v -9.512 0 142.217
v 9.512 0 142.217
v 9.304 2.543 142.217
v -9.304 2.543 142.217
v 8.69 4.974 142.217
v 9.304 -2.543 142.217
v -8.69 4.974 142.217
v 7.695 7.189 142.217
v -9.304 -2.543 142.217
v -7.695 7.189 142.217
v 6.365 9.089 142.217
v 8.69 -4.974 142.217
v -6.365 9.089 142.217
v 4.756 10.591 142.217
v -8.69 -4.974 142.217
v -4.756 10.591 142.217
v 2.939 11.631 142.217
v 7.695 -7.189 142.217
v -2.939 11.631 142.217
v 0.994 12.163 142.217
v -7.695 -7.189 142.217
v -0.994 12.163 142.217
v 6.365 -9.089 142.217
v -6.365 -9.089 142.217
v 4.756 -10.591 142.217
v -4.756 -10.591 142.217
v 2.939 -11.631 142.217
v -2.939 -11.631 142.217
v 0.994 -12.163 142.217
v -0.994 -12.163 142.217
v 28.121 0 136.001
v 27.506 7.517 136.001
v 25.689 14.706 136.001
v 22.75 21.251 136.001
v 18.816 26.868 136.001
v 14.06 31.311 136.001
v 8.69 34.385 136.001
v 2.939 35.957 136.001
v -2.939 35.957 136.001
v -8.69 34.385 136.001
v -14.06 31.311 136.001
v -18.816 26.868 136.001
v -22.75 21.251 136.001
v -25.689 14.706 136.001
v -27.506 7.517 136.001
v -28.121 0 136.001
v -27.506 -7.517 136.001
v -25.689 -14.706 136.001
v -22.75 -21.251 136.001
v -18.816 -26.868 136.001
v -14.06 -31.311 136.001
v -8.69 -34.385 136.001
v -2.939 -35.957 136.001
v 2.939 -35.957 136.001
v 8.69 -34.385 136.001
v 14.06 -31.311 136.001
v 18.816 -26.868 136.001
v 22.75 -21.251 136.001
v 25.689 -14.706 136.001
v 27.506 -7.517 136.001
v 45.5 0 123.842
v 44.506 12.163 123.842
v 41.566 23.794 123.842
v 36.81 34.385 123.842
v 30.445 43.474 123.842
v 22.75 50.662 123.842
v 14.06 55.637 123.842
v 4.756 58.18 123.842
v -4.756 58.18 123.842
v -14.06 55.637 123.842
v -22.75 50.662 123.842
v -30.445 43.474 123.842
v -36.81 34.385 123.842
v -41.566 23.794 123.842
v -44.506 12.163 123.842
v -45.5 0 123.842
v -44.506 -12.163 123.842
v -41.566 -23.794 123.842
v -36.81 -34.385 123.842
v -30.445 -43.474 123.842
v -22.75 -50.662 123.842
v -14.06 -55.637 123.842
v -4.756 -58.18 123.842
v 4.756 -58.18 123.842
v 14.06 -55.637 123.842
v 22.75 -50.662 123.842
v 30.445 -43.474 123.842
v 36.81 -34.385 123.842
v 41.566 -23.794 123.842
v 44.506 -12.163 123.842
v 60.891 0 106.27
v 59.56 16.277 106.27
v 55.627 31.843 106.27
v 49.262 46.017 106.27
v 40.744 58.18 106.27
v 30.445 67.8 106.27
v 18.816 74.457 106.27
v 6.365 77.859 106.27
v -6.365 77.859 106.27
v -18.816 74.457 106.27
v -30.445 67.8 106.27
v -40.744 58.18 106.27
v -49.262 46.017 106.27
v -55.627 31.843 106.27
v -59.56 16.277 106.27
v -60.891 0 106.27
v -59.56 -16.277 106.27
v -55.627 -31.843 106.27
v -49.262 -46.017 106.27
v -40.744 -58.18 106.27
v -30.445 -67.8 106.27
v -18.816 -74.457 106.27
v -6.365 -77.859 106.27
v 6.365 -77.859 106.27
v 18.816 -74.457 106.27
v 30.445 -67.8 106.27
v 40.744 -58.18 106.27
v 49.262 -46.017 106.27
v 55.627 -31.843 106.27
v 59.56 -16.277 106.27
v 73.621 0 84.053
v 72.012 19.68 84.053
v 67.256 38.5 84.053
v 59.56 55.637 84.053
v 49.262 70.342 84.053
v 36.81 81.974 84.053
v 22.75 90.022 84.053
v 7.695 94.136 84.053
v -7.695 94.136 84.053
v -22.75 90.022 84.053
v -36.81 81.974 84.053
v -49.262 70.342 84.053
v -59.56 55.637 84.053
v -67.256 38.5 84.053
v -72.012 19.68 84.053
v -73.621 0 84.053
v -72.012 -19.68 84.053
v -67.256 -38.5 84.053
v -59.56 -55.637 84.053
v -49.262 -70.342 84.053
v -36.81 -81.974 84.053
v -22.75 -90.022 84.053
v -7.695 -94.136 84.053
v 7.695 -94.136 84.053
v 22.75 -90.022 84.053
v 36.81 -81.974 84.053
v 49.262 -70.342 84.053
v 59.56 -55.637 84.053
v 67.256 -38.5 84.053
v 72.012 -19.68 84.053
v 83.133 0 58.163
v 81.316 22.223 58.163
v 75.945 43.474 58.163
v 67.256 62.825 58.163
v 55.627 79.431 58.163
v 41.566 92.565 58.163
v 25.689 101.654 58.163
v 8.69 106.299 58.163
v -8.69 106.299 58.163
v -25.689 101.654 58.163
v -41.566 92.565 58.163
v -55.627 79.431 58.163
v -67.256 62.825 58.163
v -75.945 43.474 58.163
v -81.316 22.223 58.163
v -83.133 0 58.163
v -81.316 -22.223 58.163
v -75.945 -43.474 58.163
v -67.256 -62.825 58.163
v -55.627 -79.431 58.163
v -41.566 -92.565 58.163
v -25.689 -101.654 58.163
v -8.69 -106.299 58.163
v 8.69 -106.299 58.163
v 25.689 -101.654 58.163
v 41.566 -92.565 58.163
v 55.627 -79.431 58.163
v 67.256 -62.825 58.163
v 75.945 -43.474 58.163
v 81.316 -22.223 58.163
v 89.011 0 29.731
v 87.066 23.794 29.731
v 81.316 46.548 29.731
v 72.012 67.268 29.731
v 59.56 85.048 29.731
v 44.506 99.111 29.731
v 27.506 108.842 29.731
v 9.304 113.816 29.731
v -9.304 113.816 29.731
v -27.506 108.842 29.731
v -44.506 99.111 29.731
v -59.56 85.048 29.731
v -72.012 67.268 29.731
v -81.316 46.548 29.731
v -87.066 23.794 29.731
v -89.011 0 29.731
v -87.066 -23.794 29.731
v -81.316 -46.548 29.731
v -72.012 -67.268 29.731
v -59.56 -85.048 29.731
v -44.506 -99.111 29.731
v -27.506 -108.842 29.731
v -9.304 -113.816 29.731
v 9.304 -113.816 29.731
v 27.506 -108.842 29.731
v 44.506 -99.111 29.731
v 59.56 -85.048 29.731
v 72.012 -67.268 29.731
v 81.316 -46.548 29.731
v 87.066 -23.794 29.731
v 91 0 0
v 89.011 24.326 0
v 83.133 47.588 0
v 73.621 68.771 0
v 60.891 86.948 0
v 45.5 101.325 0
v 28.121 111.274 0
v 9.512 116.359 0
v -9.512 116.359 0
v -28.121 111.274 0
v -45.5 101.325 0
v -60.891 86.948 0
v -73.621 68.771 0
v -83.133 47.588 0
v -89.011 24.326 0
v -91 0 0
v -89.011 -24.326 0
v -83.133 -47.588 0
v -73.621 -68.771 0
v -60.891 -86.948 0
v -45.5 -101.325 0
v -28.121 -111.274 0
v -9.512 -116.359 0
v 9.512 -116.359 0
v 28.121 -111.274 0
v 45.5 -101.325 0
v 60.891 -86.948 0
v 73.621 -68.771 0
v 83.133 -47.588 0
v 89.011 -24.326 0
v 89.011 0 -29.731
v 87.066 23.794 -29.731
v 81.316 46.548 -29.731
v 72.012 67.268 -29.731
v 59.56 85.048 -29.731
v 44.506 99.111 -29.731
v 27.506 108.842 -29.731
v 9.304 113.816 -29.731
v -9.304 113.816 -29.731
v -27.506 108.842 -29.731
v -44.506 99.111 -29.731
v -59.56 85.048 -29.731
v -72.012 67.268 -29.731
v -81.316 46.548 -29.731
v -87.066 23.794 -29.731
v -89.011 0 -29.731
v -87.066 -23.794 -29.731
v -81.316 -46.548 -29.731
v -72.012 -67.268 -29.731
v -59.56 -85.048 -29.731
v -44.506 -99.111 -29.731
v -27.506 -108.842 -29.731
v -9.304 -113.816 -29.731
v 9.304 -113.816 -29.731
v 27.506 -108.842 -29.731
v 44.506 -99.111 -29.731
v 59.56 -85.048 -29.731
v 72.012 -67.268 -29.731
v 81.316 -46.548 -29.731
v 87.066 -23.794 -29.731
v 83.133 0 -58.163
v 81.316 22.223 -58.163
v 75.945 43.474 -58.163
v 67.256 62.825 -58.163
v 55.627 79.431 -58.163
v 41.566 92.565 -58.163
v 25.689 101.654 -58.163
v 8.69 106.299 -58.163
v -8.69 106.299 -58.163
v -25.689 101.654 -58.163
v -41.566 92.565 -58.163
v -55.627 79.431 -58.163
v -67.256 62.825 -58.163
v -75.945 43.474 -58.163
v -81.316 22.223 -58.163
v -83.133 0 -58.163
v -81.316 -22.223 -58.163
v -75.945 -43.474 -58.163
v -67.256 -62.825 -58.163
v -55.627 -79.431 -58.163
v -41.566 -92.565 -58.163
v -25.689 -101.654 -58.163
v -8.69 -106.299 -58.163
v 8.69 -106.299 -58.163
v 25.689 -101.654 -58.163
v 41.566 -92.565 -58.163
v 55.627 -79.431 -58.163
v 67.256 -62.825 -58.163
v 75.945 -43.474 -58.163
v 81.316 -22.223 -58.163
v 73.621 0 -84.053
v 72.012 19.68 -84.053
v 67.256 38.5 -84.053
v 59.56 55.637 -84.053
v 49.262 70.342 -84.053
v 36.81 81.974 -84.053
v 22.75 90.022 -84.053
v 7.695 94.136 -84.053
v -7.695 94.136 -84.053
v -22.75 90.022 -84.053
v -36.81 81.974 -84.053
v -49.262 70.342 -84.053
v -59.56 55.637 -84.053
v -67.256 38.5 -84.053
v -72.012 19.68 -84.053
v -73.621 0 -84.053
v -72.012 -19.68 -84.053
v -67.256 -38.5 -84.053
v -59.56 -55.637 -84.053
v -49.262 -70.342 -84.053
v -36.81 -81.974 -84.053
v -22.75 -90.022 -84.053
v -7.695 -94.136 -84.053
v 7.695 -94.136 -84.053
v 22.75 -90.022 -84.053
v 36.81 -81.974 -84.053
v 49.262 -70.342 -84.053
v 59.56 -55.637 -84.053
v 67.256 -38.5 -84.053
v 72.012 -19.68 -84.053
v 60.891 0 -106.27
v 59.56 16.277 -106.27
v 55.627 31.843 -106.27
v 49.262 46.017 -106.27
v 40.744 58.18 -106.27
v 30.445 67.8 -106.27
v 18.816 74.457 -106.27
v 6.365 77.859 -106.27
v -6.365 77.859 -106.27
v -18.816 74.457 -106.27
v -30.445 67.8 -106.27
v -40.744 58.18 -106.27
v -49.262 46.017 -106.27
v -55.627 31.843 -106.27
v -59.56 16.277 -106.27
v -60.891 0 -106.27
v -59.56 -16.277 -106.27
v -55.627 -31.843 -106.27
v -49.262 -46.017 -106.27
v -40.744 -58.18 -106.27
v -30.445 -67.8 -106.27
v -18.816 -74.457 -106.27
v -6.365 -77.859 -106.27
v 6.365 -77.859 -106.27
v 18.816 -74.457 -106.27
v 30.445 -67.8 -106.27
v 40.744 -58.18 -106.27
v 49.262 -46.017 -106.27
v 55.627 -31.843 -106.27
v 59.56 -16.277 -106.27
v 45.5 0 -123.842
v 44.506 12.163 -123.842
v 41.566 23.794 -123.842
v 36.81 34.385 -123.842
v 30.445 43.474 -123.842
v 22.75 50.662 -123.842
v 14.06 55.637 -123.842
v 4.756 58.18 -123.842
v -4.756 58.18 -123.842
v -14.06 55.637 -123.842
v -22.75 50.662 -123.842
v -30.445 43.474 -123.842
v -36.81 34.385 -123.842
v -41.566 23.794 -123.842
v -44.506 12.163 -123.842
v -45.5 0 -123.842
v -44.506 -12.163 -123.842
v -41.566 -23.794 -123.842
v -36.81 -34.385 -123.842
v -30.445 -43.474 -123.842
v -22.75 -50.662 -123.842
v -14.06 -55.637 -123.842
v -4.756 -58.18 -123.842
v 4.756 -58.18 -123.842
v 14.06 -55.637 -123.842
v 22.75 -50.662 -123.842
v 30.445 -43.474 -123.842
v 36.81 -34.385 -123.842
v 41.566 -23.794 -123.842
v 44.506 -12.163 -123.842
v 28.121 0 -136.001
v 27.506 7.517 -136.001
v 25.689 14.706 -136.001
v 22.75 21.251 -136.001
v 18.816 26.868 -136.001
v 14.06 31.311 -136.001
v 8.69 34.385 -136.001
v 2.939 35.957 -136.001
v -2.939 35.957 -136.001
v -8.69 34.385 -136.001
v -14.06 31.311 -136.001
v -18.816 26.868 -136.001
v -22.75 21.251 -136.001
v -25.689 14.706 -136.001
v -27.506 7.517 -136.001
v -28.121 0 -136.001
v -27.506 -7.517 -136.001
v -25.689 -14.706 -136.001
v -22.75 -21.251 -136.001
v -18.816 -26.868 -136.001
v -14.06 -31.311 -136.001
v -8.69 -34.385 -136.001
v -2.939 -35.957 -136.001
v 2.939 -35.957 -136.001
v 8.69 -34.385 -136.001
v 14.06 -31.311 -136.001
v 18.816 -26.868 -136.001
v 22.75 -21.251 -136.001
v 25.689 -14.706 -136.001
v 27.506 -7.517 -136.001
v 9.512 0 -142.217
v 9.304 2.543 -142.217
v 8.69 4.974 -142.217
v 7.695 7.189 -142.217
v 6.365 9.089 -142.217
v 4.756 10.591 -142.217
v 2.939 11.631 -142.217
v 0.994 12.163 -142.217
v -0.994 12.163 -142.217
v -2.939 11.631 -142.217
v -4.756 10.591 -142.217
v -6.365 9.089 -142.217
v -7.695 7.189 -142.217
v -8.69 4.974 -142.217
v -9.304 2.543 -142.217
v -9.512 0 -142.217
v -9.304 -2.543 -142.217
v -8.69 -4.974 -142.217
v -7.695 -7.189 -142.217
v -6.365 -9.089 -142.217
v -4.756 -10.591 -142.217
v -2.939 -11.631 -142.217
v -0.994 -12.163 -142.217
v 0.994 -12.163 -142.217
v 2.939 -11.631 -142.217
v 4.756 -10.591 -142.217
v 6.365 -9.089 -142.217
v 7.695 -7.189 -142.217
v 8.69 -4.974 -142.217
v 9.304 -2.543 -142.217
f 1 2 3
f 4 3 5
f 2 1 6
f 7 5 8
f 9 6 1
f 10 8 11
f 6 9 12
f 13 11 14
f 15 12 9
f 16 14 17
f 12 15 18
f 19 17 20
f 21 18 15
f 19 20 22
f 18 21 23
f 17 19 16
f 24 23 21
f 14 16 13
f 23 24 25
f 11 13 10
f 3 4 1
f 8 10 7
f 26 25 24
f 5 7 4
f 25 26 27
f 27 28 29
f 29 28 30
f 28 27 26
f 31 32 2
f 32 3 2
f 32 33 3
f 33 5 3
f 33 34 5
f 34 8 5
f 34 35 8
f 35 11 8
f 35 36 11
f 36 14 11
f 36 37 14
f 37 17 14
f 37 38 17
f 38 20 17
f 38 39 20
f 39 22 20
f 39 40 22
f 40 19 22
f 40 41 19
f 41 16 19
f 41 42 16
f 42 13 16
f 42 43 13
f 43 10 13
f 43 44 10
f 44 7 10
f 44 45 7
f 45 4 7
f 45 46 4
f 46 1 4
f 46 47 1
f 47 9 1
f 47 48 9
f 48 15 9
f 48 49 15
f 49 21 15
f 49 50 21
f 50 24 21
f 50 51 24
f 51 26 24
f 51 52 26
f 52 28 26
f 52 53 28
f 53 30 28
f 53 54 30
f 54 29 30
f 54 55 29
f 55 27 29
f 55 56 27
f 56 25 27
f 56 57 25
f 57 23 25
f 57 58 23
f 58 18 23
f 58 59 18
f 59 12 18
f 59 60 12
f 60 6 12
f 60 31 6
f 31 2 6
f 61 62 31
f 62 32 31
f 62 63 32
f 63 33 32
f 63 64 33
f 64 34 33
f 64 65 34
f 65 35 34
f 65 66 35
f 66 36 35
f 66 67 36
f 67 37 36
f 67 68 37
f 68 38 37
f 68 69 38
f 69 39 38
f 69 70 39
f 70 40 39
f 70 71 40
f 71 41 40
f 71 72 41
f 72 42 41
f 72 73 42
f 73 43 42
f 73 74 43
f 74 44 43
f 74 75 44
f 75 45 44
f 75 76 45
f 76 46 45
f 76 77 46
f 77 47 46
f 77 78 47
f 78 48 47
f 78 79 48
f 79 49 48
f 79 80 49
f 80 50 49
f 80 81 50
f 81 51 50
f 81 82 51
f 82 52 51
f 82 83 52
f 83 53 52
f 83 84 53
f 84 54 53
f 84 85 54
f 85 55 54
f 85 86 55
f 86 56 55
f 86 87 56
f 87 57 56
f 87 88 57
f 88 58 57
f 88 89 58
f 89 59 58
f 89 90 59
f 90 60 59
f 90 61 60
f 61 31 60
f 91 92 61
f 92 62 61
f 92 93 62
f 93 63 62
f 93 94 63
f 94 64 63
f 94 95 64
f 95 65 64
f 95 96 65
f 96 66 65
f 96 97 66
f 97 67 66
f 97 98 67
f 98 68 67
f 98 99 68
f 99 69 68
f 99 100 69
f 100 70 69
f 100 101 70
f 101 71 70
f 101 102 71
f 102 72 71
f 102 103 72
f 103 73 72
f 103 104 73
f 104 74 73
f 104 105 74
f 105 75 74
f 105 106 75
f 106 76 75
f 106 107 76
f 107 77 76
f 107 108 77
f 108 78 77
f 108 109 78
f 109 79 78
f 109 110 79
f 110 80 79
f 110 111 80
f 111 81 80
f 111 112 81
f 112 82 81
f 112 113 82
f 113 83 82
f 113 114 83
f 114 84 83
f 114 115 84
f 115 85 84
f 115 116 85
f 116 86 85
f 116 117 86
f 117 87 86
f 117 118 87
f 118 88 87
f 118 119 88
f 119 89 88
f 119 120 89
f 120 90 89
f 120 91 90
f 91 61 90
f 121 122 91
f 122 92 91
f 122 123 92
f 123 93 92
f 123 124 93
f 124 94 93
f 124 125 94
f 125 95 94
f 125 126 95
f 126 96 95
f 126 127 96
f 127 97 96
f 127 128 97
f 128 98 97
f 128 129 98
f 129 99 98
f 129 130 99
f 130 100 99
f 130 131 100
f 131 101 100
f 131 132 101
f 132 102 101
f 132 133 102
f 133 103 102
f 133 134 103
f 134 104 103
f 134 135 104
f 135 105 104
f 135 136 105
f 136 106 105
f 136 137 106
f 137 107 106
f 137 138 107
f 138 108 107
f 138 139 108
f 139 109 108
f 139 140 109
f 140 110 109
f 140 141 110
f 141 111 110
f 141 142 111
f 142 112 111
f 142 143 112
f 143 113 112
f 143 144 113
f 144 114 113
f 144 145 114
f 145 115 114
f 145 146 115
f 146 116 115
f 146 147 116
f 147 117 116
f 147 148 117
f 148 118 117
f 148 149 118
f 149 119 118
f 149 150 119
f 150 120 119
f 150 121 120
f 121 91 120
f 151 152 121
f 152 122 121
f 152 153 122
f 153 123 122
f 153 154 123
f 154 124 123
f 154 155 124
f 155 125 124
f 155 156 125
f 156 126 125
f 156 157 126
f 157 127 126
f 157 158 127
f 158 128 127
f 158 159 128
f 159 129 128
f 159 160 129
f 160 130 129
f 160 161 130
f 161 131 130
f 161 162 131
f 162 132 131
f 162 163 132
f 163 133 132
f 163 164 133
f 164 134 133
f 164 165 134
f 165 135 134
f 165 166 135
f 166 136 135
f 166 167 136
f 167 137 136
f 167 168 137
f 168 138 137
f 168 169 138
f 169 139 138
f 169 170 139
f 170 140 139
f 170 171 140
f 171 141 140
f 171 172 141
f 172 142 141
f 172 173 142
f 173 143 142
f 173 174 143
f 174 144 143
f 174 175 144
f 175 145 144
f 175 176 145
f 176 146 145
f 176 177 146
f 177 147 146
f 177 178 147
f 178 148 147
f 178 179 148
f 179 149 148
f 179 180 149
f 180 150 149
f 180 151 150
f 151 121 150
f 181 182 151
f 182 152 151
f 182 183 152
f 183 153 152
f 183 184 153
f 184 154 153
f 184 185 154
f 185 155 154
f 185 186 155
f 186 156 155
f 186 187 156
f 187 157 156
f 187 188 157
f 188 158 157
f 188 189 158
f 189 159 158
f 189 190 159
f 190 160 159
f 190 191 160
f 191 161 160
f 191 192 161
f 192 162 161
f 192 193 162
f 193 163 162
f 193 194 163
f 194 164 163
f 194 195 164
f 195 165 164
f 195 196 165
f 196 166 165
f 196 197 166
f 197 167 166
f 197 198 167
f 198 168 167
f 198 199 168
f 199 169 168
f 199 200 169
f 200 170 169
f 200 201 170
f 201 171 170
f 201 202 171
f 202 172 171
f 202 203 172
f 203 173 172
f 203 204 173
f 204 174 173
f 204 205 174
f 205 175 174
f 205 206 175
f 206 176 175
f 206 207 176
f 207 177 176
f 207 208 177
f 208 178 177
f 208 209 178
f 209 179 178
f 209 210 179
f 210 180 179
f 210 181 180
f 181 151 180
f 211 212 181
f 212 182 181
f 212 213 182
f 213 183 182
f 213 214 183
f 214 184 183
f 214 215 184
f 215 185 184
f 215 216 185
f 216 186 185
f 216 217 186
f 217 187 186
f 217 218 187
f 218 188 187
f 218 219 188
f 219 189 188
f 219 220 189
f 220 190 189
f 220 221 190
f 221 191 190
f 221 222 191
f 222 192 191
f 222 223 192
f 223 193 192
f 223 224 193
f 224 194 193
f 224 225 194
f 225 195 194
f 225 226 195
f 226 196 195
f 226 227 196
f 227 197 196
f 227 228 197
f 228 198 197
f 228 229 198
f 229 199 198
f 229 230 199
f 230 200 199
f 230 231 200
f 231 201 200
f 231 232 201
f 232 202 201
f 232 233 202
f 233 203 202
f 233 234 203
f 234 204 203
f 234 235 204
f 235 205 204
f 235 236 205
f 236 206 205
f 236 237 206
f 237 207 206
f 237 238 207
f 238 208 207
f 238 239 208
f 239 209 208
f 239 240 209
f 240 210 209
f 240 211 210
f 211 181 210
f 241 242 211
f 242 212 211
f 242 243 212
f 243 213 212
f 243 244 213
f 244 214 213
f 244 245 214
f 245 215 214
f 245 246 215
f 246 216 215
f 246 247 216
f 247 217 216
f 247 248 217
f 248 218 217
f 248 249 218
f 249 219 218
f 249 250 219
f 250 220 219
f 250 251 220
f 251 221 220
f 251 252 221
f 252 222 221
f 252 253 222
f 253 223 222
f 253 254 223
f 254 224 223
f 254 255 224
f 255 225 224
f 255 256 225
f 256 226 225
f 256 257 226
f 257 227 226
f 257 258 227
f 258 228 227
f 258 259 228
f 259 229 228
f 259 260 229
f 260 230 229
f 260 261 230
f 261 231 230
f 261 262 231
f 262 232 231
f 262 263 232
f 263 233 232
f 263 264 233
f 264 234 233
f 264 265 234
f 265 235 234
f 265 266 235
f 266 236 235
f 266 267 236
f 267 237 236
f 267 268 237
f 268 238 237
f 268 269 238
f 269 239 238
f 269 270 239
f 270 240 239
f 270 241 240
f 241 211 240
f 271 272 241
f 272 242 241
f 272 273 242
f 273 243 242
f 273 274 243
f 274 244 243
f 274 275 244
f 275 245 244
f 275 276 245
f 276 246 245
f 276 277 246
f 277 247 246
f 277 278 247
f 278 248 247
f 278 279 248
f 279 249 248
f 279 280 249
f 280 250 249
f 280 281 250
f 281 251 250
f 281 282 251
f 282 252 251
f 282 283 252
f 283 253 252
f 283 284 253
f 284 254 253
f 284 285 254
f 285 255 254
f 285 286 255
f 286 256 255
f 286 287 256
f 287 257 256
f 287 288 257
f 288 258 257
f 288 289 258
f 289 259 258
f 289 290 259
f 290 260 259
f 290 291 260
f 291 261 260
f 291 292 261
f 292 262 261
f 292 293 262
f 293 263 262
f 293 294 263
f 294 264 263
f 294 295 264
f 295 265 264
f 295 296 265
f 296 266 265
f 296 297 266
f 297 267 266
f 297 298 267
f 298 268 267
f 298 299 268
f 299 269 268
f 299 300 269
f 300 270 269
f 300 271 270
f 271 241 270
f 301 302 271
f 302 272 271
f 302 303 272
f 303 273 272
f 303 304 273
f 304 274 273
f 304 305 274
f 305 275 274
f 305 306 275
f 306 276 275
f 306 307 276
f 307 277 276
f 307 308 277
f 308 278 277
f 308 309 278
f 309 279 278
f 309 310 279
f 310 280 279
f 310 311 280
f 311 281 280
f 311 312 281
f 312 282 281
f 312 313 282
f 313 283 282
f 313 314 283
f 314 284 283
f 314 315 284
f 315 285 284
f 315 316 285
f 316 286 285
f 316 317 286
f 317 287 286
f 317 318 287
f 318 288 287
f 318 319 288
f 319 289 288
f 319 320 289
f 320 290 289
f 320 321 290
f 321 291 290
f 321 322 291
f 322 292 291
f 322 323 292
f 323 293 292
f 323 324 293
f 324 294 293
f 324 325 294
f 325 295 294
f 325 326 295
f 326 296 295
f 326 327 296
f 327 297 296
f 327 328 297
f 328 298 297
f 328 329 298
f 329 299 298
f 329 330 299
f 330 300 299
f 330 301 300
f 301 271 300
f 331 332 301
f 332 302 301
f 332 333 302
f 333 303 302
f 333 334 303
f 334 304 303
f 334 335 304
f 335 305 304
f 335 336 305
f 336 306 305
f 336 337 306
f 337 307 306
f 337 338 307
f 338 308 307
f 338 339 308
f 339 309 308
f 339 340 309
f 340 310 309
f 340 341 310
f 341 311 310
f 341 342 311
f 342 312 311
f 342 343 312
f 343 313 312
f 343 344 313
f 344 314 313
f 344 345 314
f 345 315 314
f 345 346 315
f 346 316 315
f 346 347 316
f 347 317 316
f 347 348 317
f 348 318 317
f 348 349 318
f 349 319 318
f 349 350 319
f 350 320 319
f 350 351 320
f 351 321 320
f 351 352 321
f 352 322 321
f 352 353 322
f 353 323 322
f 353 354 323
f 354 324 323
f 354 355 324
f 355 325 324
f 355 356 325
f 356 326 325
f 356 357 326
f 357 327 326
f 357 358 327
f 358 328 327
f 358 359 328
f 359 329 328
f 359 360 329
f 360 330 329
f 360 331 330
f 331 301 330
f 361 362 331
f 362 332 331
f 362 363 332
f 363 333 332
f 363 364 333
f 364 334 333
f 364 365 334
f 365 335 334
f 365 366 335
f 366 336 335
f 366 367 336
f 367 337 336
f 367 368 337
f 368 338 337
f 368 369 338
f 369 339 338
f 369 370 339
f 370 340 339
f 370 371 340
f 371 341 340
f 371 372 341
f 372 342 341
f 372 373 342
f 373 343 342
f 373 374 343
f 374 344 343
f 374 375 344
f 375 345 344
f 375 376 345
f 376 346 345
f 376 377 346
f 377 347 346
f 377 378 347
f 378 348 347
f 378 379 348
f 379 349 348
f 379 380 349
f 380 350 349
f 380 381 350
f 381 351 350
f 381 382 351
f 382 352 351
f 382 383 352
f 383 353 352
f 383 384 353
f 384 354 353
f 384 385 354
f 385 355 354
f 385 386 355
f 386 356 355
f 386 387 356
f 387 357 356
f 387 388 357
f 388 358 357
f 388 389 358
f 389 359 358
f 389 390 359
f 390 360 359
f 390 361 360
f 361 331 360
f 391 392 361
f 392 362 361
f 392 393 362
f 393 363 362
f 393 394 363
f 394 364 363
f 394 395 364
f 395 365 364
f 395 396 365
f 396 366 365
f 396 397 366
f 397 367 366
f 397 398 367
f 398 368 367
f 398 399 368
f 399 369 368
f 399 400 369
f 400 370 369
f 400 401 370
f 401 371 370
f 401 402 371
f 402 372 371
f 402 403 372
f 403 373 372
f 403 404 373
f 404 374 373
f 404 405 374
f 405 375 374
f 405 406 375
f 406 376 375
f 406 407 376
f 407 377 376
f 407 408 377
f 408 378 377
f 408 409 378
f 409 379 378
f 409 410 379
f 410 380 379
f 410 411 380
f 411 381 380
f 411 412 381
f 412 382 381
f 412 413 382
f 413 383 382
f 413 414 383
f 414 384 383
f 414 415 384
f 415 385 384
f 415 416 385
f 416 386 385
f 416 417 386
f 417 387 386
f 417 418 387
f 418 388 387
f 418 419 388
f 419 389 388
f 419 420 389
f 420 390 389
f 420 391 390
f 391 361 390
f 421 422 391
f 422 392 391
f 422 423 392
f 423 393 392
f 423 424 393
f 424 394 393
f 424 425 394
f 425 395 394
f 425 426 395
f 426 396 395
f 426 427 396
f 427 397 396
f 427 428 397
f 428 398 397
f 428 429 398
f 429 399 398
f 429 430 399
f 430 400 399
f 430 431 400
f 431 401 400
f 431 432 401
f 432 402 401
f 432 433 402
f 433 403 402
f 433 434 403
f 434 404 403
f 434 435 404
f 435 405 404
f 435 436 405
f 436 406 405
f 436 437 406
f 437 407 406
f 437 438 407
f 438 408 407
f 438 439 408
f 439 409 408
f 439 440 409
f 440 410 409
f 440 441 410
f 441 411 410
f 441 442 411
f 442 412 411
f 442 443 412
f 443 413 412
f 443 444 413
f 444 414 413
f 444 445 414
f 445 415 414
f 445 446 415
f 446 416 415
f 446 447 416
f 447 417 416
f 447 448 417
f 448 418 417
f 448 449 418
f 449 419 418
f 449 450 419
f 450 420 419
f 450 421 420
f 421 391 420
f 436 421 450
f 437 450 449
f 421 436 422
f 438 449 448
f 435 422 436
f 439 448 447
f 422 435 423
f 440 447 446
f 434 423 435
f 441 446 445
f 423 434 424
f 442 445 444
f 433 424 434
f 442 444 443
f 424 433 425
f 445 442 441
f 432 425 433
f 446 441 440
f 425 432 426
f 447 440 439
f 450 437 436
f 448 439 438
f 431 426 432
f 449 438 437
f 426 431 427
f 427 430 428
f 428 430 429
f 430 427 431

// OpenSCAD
// Generated by SolidPython 1.0.1 on 2020-07-29 00:39:26


scale(v = [7, 9, 11]) {
	sphere(r = 13);
}
/***********************************************
*********      SolidPython code:      **********
************************************************
 
# import packages: SolidPython
from solid import *
from solid.utils import *
from itertools import chain, combinations


class Resize:

    def __init__(self, scad_file):
        self.scad_file = scad_file
        #self.scad_file = import_scad(scad_file)
        # cone/cylinder param:
        self.r1 = 0
        self.r2 = 0
        self.h = 0
        # rectangular prism param:
        self.w = 0
        self.l = 0
        # ellipse param:
        self.r = 0

    # import OpenScad code (file name corresponds to shape)


    # classify shape + parameters
    def assign(self, param1, param2, param3):
        if self.scad_file == 'cone.scad':
            self.r1 = param1
            self.r2 = param2
            self.h = param3
        elif self.scad_file == 'cylinder.scad':
            self.r1 = param1
            self.r2 = param2
            self.h = param3
        elif self.scad_file == 'rectangularPrism.scad':
            self.h = param1
            self.l = param2
            self.w = param3
        else:
            self.r = param1
            self.h = param2

    # resize parameters
    def iterate(self):
        x = range(3, 20, 2)
        i = 1
        if self.scad_file == 'cone.scad':
            tempList = list(combinations(x, 2))
            for temp in tempList:
                param1 = temp[0]
                param2 = temp[1]
                filepath = 'produced_scad_files/' + 'cone' + str(param1) + '_' + str(param2) + '_' + '.scad'
                scad_render_to_file(cylinder(h=param1, r1=param2, r2=0), filepath)

        elif self.scad_file == 'cylinder.scad':
            tempList = list(combinations(x, 3))
            for temp in tempList:
                param1 = temp[0]
                param2 = temp[1]
                filepath = 'produced_scad_files/' + 'cylinder' + str(param1) + '_' + str(param2) + '_' + '.scad'
                scad_render_to_file(cylinder(h=param1, r1=param2, r2=param2), filepath)

        elif self.scad_file == 'rectangularPrism.scad':
            tempList = list(combinations(x, 3))
            for temp in tempList:
                param1 = temp[0]
                param2 = temp[1]
                param3 = temp[2]
                filepath = 'produced_scad_files/' + 'rectangularPrism' + str(param1) + '_' + str(param2) + '_' + str(
                    param3) + '.scad'
                scad_render_to_file(cube(size=(param1, param2, param3)), filepath)

        elif self.scad_file == 'ellipse.scad':
            tempList = list(combinations(x, 4))
            for temp in tempList:
                param1 = temp[0]
                param2 = temp[1]
                param3 = temp[2]
                param4 = temp[3]
                filepath = 'produced_scad_files/' + 'ellipse' + str(param1) + '_' + str(param2) + '_' + str(param3) + '_' + str(param4) + '.scad'
                scad_render_to_file(scale([param1, param2, param3])(sphere(r=param4)), filepath)

    def render_to_scadfile(self):
        scad_render_to_file(scad, 'example.scad') 
 
************************************************/
